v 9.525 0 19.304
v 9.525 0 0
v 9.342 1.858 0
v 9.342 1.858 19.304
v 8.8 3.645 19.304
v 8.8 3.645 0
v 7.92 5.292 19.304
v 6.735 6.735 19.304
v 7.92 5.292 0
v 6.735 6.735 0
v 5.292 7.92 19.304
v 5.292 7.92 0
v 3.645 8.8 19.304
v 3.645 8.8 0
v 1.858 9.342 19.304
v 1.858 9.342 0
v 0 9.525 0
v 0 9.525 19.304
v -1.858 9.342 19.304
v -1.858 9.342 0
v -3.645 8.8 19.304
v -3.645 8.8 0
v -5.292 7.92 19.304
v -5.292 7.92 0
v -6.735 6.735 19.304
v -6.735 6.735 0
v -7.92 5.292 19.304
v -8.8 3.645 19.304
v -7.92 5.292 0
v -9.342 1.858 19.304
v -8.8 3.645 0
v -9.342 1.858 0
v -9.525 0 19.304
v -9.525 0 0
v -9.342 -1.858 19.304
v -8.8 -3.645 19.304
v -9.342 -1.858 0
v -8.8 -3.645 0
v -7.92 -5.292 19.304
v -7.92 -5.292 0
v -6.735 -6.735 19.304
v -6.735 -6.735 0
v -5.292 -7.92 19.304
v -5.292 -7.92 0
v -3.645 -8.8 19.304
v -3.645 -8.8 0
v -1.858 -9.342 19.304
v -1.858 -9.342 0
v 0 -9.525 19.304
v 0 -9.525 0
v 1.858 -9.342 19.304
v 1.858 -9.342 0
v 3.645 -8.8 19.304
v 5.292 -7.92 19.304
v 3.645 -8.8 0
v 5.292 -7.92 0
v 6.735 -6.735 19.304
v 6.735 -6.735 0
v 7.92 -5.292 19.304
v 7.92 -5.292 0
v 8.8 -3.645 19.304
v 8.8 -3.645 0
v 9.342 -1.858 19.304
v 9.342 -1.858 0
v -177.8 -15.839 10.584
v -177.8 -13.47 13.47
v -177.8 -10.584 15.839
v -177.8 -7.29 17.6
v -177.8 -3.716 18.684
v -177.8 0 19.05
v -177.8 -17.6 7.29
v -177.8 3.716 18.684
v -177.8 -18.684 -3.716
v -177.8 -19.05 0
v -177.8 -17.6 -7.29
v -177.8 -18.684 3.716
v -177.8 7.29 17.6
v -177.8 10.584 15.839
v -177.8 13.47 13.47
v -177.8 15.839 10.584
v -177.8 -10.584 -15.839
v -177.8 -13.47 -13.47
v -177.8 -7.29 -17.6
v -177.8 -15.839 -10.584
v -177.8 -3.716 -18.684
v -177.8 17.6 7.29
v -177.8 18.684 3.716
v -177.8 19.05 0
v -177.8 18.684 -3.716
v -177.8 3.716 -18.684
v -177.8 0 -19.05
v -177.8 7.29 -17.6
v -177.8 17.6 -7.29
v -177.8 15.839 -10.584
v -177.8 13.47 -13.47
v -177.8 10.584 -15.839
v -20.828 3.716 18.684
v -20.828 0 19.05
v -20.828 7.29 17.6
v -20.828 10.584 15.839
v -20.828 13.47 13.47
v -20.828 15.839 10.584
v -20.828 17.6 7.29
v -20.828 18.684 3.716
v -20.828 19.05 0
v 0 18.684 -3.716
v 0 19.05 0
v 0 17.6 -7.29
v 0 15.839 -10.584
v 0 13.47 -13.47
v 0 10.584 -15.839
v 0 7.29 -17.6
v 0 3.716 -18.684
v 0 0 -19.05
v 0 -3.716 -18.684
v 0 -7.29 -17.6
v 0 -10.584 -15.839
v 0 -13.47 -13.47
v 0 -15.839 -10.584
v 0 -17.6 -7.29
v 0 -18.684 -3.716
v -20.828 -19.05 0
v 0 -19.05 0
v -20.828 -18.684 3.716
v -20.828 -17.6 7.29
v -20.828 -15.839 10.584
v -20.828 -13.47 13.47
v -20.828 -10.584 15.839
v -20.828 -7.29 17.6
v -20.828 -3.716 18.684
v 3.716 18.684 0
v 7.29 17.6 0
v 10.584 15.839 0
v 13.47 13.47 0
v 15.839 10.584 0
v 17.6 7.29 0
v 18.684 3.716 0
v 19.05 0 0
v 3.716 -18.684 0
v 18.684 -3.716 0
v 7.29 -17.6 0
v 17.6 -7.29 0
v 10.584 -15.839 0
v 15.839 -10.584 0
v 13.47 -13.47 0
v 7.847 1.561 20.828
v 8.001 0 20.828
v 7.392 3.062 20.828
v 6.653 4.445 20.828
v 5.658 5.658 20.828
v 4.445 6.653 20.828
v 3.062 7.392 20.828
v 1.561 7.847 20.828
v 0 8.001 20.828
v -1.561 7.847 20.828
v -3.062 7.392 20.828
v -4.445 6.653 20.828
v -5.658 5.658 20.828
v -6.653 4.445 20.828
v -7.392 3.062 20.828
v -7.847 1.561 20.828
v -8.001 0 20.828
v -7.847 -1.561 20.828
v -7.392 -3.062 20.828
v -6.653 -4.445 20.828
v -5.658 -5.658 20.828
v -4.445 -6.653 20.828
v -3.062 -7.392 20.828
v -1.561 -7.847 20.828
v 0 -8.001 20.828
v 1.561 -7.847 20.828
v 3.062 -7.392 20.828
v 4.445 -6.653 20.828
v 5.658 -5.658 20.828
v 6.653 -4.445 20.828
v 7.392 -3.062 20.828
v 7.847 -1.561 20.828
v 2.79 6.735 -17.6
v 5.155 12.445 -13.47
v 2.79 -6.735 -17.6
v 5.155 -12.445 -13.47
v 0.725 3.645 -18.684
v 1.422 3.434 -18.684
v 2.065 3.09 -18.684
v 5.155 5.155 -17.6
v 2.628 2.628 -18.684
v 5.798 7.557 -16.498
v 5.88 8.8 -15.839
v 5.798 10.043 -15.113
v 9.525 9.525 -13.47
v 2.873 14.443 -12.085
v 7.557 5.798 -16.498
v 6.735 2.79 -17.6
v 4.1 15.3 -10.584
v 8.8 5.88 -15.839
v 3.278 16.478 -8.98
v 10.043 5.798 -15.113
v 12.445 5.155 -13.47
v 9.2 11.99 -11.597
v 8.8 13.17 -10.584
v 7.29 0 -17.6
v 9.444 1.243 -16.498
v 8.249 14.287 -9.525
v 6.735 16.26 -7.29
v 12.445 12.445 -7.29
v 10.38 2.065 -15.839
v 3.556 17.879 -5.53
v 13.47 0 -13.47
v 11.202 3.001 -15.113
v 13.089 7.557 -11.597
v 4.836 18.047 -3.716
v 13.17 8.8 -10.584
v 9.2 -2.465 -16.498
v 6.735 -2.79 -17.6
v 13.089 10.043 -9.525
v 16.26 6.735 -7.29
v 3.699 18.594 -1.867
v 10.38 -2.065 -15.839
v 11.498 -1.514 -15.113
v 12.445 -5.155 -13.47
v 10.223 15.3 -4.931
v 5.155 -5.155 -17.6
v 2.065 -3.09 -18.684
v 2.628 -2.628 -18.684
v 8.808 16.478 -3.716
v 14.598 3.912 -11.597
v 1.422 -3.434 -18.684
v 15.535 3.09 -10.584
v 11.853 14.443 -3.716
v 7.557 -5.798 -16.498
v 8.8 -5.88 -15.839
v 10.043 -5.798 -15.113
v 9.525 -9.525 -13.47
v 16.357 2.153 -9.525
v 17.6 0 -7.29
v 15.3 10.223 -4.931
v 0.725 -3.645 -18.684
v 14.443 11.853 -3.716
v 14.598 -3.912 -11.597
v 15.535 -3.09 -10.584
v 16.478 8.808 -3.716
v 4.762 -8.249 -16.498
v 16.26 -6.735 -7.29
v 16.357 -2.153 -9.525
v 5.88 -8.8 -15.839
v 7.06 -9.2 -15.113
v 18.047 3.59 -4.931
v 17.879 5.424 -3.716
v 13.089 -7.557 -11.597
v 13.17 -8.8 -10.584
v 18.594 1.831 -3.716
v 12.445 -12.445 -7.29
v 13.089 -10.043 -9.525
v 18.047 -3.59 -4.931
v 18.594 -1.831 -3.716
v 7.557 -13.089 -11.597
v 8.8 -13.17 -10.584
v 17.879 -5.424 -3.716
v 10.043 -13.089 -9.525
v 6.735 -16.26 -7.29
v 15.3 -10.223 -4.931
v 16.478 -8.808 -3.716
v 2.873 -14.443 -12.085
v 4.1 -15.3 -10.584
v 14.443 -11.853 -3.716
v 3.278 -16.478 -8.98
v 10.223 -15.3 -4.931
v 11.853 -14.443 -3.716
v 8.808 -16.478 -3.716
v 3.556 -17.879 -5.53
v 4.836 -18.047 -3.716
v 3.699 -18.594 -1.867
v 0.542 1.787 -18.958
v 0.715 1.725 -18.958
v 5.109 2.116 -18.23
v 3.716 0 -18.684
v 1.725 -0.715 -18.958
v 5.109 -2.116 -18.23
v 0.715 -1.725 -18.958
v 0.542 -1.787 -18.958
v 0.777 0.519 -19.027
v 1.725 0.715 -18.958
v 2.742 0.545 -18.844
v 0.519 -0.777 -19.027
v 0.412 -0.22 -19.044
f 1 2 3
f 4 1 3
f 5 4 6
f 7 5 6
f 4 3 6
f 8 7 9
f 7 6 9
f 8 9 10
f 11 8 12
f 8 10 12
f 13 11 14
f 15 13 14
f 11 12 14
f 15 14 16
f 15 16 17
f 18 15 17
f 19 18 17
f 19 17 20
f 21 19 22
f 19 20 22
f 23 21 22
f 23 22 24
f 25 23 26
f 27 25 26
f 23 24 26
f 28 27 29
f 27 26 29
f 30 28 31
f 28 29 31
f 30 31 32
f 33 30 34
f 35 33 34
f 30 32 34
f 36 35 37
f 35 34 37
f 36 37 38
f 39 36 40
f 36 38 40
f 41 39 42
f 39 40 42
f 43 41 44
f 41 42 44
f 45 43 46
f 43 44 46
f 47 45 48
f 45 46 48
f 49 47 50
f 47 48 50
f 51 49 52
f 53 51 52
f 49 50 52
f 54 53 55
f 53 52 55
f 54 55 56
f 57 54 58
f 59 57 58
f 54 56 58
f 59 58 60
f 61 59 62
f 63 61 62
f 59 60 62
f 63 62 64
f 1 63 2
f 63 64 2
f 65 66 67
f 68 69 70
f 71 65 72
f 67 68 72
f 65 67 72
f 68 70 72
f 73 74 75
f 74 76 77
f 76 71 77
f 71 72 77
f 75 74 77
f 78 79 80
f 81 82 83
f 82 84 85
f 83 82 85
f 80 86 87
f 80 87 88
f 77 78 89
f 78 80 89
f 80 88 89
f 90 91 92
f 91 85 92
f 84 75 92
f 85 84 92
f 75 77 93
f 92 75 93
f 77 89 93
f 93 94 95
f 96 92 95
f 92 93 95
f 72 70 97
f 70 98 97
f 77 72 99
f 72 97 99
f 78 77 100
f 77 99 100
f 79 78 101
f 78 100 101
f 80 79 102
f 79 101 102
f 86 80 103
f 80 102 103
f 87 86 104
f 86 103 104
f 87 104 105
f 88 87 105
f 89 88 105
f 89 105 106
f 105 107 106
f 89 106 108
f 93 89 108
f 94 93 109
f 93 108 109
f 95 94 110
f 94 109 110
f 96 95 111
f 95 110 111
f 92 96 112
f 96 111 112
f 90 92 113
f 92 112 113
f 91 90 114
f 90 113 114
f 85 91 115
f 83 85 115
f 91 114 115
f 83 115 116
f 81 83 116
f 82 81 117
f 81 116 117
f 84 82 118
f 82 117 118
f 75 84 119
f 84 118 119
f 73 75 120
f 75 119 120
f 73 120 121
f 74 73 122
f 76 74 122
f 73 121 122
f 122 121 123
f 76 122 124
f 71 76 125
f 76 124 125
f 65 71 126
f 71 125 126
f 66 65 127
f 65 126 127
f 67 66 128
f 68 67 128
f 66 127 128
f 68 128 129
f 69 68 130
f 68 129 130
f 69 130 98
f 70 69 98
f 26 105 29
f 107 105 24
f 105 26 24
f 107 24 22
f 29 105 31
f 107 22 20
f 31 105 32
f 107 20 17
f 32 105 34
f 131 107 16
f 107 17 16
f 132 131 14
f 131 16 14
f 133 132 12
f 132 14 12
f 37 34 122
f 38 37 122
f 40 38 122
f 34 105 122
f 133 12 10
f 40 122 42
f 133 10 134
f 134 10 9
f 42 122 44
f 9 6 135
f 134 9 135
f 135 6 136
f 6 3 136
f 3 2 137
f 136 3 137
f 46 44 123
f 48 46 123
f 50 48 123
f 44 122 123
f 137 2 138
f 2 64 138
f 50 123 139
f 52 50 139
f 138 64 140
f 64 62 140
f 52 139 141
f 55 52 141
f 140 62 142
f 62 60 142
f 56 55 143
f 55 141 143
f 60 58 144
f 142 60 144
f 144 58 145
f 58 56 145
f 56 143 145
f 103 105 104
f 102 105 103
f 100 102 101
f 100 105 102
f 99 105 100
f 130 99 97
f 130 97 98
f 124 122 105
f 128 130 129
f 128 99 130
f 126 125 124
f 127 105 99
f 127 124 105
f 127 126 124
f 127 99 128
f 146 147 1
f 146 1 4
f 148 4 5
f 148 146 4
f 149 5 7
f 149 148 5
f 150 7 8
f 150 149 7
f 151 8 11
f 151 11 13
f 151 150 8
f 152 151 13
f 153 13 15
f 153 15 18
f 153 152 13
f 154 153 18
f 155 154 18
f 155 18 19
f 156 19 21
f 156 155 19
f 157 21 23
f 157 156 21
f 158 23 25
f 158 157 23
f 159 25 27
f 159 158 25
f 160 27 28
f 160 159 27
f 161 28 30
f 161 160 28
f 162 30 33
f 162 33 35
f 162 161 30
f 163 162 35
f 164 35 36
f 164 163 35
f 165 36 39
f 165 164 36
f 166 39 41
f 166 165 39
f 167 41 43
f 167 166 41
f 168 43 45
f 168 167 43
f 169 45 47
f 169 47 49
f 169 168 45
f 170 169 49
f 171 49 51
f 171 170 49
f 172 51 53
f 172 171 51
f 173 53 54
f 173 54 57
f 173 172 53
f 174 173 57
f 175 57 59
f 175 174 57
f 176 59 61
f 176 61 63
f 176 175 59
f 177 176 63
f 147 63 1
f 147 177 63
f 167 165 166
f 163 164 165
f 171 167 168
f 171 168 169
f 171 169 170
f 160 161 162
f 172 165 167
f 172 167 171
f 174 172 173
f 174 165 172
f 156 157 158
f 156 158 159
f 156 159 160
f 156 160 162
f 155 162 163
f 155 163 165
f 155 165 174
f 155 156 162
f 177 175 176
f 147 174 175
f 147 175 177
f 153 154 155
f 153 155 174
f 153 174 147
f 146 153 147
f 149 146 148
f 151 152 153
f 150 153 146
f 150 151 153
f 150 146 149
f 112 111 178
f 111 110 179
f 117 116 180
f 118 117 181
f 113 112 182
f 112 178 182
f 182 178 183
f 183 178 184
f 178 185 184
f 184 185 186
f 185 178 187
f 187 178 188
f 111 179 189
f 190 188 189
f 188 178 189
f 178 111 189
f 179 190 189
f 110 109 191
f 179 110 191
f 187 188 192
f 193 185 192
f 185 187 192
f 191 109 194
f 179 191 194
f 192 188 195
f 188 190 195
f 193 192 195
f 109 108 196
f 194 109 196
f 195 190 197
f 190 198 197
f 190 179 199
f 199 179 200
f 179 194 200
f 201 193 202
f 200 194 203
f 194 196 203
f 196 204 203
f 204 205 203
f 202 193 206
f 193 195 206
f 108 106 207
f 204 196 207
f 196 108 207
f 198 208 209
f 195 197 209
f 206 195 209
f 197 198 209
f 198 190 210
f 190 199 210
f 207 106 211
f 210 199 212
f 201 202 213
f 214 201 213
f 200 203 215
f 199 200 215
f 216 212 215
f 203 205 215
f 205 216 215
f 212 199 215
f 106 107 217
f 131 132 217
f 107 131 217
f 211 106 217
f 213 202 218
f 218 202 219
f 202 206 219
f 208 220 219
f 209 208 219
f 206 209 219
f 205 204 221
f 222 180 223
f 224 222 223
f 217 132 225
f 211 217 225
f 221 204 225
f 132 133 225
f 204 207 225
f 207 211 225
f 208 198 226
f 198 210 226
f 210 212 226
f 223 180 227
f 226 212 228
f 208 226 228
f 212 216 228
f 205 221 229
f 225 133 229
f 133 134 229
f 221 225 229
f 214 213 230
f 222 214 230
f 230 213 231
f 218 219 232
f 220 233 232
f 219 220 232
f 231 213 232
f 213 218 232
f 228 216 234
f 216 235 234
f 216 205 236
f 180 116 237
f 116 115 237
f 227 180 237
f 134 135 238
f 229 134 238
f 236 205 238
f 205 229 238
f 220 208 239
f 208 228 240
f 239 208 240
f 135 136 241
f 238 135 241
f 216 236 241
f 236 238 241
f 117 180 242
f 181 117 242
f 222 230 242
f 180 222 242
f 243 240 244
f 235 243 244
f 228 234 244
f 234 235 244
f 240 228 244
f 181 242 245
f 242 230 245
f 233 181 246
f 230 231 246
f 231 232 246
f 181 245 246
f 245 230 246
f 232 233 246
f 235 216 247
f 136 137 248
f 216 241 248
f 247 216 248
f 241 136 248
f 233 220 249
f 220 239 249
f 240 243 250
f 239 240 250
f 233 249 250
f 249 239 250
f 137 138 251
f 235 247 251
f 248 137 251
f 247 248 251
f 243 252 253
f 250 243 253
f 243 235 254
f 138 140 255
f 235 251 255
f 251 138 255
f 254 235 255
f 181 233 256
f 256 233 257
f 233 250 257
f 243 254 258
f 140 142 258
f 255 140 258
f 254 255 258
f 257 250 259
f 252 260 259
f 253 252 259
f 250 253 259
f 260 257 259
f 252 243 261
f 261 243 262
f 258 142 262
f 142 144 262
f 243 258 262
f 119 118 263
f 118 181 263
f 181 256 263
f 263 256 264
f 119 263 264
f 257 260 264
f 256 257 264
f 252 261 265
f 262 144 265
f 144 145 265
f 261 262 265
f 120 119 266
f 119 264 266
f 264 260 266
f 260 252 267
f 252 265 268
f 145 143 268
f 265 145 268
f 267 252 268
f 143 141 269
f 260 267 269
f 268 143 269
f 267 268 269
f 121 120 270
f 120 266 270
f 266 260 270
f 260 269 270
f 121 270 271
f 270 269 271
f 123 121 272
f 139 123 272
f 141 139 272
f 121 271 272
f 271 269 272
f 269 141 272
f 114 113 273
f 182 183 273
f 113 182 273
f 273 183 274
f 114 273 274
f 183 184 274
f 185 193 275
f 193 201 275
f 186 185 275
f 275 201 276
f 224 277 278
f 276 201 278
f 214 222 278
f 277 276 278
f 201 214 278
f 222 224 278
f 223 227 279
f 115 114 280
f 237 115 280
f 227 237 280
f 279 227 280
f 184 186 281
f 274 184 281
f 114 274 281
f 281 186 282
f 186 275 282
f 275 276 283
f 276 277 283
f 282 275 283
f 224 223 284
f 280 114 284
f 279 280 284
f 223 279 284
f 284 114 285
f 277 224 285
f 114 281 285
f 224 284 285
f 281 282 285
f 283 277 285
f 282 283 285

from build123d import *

# Parameters (mm, degrees)
F0_W     = 177.8
F0_H     = 19.05
F2_W     = 20.828
F2_H     = 20.828
F3_DEPTH = 20.828
F6_R     = 9.525
F7_DEPTH = 20.828
F8_SIZE  = 1.524


with BuildPart() as f1:
    # F0 (on Front) → F1 (revolve)
    with BuildSketch(Plane.XZ):
        with Locations((-88.9, 9.525)):
            Rectangle(F0_W, F0_H)
    revolve(axis=Axis((-88.9, 0, 0), (-1, 0, 0)))

    # F2 (on Front) → F3 (cut, symmetric)
    with BuildSketch(Plane.XZ):
        with Locations((-10.414, 10.414)):
            Rectangle(F2_W, F2_H)
    extrude(amount=F3_DEPTH, both=True, mode=Mode.SUBTRACT)

    # F4 (on Front) → F5 (revolve)
    with BuildSketch(Plane.XZ):
        with BuildLine():
            Line((19.05, 0), (0, 0))
            Line((0, 0), (0, -19.05))
            ThreePointArc((0, -19.05), (13.470384, -13.470384), (19.05, 0))
        make_face()
    revolve(axis=Axis((0, 0, -9.525), (0, 0, -1)))

    # F6 (on face) → F7 (join)
    with BuildSketch(Plane.XY):
        Circle(F6_R)
    extrude(amount=F7_DEPTH)

    # F8
    f8_edges = [f1.edges().sort_by_distance(p)[0] for p in [
        (-9.525, 0, 20.828),
    ]]
    chamfer(f8_edges, length=F8_SIZE)


solid = f1.part
